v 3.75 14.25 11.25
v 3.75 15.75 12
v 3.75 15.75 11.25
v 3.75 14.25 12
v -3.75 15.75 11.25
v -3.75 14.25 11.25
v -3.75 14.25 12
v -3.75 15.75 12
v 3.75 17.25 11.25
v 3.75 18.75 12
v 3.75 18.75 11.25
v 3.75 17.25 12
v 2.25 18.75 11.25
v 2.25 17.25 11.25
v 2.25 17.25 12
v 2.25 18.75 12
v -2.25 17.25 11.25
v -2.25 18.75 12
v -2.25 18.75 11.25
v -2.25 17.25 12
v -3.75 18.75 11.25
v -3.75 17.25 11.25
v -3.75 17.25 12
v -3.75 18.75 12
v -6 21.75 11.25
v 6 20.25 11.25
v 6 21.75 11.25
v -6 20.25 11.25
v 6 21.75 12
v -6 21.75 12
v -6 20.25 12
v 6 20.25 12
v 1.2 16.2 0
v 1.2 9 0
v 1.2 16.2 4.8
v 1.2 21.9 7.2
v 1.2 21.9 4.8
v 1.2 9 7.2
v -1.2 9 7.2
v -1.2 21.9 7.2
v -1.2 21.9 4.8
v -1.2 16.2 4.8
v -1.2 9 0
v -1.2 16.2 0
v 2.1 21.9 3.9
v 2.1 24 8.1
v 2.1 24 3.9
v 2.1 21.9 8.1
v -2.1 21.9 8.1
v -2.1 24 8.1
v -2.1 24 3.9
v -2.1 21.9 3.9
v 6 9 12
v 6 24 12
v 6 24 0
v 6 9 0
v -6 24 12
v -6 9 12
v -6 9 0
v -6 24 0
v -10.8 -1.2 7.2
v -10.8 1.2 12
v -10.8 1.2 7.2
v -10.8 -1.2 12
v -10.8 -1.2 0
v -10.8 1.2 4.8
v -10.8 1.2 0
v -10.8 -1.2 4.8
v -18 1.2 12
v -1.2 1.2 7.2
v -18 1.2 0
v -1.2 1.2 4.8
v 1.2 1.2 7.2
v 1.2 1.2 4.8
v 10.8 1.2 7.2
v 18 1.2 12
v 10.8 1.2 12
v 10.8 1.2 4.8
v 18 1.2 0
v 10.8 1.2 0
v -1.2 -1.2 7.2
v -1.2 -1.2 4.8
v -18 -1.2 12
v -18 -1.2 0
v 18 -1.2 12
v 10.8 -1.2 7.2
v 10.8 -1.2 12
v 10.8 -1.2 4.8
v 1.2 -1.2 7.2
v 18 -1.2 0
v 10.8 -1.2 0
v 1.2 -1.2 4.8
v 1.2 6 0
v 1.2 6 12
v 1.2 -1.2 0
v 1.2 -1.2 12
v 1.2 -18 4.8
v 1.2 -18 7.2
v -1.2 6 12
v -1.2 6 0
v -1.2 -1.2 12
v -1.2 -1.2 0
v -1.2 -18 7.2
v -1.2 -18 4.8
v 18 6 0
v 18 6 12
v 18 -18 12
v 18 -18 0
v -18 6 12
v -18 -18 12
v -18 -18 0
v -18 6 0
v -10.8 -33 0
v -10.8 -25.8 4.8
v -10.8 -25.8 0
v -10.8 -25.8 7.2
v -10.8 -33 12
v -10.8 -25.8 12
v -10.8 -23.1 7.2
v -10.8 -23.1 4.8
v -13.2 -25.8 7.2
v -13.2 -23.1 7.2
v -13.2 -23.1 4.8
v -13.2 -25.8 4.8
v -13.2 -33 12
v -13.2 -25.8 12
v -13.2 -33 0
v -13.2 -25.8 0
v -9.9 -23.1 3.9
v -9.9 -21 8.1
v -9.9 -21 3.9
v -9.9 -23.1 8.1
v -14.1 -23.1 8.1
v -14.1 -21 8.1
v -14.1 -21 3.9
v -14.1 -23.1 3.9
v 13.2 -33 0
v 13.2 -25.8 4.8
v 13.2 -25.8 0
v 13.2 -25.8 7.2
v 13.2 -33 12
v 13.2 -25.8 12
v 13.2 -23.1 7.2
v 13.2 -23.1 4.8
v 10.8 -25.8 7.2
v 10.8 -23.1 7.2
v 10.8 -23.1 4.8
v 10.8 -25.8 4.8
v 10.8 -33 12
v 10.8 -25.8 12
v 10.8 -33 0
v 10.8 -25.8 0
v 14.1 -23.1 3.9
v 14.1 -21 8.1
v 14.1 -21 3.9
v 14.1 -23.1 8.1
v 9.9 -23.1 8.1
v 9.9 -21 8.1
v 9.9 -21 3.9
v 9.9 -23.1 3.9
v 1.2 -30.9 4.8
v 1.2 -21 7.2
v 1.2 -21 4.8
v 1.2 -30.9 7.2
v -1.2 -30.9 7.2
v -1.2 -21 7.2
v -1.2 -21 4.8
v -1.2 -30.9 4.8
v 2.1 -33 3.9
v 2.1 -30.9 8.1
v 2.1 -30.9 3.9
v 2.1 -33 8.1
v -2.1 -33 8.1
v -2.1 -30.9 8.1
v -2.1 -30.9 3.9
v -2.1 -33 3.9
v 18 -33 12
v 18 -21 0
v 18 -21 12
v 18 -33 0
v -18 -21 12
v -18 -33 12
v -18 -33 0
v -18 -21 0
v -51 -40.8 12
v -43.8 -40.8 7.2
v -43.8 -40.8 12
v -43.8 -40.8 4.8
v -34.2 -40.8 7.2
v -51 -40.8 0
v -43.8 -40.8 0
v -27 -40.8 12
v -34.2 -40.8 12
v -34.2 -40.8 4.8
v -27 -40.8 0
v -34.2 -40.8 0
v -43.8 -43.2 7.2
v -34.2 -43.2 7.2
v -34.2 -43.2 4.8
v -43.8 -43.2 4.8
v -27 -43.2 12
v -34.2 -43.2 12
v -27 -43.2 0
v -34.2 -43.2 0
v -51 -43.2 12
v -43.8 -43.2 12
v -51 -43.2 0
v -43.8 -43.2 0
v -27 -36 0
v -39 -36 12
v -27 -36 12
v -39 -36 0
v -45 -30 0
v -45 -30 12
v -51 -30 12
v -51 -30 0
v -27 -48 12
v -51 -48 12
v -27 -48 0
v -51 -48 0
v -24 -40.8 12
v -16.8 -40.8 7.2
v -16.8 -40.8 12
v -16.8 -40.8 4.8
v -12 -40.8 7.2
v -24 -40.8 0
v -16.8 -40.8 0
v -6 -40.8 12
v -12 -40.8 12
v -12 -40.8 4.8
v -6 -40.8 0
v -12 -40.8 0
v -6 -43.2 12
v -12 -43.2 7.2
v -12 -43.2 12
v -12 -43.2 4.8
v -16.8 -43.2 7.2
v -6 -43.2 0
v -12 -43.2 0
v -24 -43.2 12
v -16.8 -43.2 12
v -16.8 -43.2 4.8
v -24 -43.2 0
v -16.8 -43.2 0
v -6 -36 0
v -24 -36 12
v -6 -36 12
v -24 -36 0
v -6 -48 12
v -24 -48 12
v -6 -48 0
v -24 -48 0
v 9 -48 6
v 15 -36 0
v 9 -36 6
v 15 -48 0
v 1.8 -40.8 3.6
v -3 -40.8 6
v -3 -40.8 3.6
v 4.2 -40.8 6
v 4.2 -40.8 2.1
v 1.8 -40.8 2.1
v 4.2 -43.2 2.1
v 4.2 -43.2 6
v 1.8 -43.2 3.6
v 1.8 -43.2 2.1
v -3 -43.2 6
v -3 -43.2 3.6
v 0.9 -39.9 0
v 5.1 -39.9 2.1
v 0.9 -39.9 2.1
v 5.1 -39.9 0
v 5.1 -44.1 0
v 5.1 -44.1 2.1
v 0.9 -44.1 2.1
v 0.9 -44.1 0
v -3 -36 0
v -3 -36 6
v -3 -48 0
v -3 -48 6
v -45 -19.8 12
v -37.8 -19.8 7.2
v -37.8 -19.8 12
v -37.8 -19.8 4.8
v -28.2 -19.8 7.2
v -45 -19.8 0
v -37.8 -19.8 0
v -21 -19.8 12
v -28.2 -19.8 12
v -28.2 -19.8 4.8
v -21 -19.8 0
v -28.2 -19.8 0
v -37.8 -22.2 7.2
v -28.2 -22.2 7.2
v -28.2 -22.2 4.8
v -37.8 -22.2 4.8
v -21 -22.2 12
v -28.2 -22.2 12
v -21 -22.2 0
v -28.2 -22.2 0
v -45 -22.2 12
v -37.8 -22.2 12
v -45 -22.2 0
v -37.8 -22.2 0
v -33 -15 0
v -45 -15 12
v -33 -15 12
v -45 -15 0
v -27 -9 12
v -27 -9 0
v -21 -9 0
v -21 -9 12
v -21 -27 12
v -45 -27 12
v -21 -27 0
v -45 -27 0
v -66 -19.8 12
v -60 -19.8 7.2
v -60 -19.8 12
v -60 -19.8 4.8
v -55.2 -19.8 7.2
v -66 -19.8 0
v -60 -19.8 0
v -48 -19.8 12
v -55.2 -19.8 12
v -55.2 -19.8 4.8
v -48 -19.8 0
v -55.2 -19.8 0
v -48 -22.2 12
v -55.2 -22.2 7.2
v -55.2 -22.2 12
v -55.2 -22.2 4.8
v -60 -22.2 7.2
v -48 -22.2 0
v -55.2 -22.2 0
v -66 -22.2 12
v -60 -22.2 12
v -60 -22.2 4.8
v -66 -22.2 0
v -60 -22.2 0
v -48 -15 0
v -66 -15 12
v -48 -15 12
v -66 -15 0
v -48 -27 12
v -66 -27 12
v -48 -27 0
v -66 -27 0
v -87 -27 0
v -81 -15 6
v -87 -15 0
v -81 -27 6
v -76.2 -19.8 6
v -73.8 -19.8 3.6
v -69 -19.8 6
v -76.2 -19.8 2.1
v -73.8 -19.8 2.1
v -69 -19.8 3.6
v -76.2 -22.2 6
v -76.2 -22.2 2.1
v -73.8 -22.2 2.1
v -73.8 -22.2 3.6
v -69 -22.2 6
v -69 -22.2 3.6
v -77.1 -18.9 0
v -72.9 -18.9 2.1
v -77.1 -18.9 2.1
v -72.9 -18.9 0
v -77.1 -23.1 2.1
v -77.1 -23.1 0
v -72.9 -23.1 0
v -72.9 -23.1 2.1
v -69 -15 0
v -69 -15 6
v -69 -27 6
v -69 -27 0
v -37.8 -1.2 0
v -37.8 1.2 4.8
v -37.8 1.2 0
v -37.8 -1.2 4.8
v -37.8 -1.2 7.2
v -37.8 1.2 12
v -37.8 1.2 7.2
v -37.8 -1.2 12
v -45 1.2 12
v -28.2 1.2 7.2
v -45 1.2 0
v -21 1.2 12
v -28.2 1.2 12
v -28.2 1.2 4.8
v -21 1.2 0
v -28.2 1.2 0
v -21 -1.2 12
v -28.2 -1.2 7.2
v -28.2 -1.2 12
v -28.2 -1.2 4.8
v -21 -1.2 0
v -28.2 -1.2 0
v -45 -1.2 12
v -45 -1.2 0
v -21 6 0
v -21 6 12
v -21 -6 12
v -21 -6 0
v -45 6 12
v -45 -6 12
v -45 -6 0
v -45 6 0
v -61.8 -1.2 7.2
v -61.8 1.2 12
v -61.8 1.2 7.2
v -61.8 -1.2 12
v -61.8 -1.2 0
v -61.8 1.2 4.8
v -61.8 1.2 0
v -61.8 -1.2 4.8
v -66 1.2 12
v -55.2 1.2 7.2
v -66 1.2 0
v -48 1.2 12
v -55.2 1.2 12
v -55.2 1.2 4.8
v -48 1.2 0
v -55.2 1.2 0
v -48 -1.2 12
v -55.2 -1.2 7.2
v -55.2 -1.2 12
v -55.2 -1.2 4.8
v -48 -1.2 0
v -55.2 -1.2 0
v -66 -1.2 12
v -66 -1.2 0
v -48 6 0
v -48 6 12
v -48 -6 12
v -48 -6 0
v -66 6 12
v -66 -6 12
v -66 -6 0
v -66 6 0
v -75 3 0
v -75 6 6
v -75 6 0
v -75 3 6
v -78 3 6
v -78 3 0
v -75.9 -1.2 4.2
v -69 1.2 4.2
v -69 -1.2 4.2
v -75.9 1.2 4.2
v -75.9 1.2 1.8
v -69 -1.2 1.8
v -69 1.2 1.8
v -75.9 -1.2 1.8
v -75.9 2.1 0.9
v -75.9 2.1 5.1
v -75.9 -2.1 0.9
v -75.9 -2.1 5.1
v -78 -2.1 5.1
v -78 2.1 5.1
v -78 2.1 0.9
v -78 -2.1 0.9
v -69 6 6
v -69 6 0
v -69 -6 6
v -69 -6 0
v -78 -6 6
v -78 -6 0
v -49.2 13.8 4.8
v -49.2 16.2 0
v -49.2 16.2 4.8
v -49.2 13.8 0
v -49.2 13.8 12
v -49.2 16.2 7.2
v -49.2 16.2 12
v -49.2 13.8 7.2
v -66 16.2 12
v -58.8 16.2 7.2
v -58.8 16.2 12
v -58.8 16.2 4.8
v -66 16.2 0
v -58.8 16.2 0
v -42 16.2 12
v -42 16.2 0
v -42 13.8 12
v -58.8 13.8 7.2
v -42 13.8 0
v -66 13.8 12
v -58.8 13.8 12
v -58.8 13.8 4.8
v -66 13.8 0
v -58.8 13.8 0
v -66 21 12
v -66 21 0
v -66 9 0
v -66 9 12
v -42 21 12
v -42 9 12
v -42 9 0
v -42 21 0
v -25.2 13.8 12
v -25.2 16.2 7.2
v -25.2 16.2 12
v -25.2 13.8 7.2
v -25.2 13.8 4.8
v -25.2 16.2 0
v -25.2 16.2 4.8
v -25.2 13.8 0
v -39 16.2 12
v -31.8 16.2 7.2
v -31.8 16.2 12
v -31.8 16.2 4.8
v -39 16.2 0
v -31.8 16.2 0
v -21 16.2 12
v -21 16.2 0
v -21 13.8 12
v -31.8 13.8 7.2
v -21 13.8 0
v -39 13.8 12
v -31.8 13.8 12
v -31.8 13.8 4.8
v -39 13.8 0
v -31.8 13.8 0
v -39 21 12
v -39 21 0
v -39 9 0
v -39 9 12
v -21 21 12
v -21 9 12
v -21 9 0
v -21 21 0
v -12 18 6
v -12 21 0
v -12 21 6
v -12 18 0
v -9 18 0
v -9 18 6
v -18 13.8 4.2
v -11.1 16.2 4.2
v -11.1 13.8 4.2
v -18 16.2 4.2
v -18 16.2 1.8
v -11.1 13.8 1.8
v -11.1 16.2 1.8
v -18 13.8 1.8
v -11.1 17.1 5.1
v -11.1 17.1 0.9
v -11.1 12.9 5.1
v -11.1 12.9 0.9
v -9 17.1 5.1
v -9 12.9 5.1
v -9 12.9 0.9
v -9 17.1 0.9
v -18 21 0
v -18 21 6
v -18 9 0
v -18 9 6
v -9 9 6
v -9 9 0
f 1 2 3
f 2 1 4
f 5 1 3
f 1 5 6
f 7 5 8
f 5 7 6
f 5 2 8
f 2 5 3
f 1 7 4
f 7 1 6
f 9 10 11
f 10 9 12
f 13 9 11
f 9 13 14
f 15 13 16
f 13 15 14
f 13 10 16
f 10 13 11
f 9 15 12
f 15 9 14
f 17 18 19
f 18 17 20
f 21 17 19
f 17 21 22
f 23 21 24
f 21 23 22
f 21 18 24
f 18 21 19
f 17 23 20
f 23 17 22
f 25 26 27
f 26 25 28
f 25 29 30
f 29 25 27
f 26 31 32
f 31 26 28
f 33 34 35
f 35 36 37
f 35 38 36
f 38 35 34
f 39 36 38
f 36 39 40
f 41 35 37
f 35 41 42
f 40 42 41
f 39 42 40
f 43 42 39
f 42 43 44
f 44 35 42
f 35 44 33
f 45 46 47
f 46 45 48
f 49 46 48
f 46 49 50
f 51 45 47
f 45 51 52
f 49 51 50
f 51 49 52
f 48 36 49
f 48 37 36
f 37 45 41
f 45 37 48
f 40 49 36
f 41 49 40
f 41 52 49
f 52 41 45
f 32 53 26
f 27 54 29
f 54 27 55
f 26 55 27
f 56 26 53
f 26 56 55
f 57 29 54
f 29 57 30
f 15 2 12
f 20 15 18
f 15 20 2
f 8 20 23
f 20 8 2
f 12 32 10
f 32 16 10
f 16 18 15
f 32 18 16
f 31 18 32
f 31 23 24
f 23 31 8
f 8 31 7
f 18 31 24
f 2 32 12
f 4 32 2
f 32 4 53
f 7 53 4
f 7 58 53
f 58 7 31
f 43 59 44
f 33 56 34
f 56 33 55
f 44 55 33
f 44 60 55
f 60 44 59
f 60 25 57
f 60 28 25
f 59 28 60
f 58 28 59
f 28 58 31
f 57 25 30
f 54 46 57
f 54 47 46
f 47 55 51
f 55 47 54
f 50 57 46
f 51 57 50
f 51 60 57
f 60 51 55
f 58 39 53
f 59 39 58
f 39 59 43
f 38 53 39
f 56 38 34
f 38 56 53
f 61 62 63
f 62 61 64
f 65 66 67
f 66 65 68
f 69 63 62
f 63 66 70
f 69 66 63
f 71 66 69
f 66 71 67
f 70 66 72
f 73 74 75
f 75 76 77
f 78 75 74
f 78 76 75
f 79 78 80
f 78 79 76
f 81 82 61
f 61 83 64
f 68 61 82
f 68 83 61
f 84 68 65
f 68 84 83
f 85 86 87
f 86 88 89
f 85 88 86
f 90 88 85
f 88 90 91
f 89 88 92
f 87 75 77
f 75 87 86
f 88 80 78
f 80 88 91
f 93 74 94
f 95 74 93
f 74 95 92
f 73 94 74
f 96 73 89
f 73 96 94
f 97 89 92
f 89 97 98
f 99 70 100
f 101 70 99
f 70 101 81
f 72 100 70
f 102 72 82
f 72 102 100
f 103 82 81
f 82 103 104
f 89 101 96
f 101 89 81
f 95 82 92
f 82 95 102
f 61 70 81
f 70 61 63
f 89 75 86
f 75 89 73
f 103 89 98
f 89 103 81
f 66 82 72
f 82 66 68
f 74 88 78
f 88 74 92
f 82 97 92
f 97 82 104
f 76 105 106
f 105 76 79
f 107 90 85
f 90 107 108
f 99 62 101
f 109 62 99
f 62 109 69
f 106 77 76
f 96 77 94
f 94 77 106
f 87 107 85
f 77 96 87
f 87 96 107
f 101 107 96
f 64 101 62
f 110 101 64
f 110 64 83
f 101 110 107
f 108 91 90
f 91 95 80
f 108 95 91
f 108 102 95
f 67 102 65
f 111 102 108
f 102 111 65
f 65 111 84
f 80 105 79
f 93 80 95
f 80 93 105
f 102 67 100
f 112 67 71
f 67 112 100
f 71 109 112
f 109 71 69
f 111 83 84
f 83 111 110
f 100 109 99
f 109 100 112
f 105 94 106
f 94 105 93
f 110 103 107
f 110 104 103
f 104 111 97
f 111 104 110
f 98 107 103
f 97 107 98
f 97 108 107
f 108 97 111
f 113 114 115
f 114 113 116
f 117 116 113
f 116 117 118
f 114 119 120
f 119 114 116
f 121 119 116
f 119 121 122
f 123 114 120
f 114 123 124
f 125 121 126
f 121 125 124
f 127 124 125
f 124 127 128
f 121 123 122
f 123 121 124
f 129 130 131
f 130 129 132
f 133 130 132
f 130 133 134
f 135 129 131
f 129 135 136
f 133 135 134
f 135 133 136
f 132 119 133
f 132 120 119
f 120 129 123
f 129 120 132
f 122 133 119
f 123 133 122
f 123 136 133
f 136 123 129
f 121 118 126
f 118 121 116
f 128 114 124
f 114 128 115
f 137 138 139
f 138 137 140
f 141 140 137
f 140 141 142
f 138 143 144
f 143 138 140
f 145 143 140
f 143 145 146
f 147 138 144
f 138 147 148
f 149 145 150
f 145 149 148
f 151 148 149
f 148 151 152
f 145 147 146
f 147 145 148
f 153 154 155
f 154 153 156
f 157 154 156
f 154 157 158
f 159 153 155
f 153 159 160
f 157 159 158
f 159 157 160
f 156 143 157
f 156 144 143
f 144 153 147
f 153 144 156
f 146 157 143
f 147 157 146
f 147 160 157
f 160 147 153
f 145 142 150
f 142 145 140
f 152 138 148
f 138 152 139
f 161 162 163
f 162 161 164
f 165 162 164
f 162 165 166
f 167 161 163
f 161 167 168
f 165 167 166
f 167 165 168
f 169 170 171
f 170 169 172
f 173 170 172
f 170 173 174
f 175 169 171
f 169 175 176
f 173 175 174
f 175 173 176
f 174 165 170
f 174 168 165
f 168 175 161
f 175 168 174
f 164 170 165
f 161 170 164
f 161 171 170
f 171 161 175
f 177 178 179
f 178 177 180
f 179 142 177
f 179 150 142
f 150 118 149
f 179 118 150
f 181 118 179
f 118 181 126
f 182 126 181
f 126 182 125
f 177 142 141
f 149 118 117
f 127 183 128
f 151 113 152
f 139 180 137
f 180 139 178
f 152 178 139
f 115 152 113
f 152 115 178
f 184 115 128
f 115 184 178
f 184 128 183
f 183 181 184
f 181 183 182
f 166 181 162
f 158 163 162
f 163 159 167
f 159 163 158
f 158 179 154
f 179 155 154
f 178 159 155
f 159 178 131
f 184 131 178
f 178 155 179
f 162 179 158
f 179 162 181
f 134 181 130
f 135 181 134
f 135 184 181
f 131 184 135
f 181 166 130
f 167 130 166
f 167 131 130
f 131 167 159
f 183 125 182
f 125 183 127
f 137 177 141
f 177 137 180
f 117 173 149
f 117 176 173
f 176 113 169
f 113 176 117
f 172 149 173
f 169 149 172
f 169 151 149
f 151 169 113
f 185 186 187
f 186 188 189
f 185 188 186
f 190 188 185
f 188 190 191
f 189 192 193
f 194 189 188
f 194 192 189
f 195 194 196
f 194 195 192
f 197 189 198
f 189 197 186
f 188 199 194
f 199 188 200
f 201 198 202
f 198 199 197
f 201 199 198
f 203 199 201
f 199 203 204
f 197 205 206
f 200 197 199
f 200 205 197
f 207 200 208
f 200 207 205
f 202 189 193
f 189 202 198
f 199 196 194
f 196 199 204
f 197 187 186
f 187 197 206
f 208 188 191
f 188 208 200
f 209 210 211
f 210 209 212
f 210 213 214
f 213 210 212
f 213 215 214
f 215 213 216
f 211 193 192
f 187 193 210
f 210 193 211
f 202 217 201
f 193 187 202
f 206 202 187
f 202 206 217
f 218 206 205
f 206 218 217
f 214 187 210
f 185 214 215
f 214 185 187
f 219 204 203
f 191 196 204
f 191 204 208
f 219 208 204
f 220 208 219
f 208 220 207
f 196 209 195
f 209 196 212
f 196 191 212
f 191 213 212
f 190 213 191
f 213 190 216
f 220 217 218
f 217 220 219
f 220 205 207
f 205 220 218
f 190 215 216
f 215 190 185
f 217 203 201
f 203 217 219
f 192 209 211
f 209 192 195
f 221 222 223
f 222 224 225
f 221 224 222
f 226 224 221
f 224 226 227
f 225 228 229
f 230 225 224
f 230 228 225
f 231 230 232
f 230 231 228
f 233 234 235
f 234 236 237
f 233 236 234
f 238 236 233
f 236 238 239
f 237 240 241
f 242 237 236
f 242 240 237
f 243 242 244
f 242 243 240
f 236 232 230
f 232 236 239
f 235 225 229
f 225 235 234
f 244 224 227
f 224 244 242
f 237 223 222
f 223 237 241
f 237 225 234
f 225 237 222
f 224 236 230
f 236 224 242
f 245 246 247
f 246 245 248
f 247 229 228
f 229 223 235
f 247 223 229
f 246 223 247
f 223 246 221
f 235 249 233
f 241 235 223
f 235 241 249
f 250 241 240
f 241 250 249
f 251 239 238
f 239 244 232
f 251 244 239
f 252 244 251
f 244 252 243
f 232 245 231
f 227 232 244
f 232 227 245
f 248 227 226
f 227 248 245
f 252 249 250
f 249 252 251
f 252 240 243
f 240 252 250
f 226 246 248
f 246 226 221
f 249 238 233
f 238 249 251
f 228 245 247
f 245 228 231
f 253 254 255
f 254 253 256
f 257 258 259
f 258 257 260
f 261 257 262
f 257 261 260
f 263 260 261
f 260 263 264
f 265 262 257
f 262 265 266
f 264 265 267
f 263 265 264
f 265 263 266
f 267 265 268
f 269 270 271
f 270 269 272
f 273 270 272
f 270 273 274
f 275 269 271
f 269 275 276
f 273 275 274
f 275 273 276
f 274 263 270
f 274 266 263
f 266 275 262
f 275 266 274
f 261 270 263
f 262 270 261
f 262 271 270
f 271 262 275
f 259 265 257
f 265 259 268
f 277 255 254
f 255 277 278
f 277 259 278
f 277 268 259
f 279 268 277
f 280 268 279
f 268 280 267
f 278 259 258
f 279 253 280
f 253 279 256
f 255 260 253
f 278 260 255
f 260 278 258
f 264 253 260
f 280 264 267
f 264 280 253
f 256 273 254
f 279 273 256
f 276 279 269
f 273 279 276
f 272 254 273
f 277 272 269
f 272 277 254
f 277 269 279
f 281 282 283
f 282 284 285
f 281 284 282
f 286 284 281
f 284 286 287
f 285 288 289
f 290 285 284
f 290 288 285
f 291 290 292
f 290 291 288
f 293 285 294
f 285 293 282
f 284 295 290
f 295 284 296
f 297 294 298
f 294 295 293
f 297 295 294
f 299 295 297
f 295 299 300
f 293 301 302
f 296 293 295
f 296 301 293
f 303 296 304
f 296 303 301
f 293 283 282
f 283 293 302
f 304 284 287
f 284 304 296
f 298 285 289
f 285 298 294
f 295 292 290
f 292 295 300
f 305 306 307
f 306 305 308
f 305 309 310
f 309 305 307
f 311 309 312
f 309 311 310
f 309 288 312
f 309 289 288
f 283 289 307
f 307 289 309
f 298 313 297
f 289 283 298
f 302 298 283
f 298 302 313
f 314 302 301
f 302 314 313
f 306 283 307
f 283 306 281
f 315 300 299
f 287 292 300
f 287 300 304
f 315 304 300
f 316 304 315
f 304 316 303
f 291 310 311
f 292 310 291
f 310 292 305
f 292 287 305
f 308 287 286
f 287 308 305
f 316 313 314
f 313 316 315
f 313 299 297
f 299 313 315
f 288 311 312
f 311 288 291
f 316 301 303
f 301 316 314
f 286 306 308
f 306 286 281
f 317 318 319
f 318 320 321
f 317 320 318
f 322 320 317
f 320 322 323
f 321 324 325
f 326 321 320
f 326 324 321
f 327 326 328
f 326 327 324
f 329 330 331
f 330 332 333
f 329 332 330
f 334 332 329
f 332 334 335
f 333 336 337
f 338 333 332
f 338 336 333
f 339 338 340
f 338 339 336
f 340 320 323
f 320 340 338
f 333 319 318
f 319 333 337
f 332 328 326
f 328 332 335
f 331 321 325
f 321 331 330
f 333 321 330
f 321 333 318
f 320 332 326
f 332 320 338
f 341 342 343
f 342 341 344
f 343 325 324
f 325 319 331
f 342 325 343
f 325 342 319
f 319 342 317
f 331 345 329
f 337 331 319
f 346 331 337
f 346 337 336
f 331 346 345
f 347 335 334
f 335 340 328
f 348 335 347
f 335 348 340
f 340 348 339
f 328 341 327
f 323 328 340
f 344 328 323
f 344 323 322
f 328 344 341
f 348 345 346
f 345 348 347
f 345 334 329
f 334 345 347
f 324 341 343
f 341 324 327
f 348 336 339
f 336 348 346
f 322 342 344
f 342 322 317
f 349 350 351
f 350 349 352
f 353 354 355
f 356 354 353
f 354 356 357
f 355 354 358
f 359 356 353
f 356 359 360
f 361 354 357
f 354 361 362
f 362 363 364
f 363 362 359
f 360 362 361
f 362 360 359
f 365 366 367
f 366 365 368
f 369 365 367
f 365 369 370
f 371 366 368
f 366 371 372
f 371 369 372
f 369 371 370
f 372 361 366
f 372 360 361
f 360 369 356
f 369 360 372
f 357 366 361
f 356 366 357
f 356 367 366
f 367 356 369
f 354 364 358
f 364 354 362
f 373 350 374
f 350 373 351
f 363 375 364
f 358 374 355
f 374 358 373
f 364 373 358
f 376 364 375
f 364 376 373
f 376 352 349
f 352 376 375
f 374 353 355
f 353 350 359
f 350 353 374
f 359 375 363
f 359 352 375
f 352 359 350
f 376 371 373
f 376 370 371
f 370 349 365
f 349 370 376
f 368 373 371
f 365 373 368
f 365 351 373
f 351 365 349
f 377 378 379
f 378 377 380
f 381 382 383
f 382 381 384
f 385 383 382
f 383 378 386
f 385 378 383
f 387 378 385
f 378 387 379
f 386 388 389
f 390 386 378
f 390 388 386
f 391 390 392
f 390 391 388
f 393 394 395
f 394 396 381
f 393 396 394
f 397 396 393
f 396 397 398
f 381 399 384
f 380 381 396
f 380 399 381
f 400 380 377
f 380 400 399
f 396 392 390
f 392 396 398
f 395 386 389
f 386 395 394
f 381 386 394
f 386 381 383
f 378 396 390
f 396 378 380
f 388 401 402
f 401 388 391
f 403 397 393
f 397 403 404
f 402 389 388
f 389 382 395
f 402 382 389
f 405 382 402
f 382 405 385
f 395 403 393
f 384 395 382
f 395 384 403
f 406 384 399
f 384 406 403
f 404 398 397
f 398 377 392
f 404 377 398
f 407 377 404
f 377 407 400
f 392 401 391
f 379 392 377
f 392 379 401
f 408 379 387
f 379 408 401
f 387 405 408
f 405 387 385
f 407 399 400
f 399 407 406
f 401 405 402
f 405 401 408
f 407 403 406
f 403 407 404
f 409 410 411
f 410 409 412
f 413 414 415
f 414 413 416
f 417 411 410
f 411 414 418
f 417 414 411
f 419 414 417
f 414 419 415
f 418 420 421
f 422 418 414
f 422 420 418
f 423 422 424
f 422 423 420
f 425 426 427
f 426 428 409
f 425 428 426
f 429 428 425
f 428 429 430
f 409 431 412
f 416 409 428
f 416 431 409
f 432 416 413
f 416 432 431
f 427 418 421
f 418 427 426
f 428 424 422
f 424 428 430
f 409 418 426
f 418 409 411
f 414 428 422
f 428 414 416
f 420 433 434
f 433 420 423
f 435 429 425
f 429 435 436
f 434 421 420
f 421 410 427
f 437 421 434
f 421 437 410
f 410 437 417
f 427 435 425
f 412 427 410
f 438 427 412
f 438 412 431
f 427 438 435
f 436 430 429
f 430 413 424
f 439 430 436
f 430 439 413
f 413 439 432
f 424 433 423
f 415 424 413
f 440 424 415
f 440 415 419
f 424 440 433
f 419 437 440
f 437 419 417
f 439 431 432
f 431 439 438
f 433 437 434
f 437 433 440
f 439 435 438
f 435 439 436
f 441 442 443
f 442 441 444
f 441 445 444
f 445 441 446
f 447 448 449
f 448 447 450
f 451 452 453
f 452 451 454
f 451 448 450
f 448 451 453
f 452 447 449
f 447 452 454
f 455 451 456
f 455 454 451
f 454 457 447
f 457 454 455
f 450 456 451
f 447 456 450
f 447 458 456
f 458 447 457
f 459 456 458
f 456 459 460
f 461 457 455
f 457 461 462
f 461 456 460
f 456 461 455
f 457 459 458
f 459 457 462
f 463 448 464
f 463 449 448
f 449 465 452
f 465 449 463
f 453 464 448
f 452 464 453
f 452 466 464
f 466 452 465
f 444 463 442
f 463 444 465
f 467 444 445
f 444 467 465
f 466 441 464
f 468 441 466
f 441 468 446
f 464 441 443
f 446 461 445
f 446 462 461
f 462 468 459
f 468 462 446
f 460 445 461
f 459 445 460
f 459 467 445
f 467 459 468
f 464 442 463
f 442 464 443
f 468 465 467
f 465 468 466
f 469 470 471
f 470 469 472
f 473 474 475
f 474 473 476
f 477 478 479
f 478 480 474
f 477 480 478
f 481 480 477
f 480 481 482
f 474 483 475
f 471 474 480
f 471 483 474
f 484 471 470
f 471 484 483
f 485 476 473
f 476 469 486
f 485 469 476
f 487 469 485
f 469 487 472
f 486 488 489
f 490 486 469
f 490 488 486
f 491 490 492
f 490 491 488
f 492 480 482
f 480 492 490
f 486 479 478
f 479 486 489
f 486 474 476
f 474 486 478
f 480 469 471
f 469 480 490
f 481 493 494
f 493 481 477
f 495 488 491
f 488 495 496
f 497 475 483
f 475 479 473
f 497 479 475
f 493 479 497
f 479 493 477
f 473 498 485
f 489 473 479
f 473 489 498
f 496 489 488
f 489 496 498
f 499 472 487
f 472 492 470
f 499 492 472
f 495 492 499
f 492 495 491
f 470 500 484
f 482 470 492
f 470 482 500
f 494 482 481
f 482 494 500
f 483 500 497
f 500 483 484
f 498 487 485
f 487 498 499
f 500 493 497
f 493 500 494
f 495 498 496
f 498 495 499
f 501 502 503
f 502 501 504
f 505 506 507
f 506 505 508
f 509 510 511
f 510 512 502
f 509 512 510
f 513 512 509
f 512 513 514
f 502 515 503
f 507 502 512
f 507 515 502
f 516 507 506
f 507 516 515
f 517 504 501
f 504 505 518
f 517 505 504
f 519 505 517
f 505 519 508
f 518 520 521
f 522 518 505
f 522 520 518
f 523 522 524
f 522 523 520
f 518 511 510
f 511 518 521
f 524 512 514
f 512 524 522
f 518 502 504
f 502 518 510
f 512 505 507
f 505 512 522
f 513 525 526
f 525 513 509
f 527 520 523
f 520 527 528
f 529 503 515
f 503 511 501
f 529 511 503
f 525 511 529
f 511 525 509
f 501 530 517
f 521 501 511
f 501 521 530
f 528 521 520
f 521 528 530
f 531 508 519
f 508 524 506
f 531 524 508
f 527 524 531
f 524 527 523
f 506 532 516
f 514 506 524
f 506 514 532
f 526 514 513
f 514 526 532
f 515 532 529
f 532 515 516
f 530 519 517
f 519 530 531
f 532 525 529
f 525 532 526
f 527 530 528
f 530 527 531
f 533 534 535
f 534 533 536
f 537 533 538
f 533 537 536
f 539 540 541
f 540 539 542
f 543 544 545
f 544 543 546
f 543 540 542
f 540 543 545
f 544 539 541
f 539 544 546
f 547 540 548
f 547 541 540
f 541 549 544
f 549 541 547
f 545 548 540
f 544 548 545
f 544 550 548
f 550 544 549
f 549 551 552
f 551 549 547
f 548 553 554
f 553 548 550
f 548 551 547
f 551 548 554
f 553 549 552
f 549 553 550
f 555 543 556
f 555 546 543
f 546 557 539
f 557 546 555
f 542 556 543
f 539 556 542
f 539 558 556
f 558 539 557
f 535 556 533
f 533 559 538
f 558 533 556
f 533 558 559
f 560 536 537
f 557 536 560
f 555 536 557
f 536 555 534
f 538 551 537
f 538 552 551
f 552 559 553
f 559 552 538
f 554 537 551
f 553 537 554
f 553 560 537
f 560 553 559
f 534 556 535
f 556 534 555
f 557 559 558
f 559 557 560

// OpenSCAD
diam=.8;
end_factor=1.75;

module arm_right_aa()
{ 
    difference()
    {   
        cube([8,4,4], true);
        union()
        {
            translate([-4,0,0]) cube([4+diam,diam,6], true);
            //translate([4,-2,0]) cube([4+diam,4+diam,diam], true);
            translate([4,0,0]) cube([4+diam,diam,6], true);
            cube([10,diam,diam], true);
        }
    }
}

module arm_right_bb()
{ 
    difference()
    {   
        cube([6,4,4], true);
        union()
        {
            translate([-3,0,0]) cube([2+diam,diam,6], true);
            translate([3,0,0]) cube([4+diam,diam,6], true);
            cube([8,diam,diam], true);
        }
    }
}
module hand_right()
{
    difference()
    {
        cube([3,4,2], true);
        union()
        {
            translate([-1.5,2,0]) cube([2,2,6], true);
            cube([5,diam,diam], true);
            translate([-1.5,0,0]) cube(end_factor*diam*[1,1,1], true);
        }
    }
}

module right_arm()
{
    translate([-11,0,2])
    {
        arm_right_aa();
        translate([-8,0,0])
        {
            arm_right_bb();
            translate([-5.5,0,-1]) hand_right();
        }
    }
}

module body()
{
    difference()
    {
        cube([12,8,4], true);
        union()
        {
            
            translate([-6,2,0]) cube([4+diam,diam,6], true);
            //translate([-6,4,0]) cube([4+diam,4+diam,diam], true);
            
            translate([6,2,0]) cube([4+diam,diam,6], true);
            //translate([6,4,0]) cube([4+diam,4+diam,diam], true);
            
            translate([0,4,0]) cube([diam,4+diam,6], true);

            translate([0,2,0]) cube([14,diam,diam], true);
            cube([diam,10,diam], true);
        }
    }
}

module hip()
{
    difference()
    {
        cube([12,4,4], true);
        union()
        {
            cube([diam,6,diam], true);
            translate([0,-2,0]) cube(end_factor*diam*[1,1,1], true);
            
            translate([-4,0,0])
            {
                cube([diam,6,diam], true);
                translate([0,2,0]) cube(end_factor*diam*[1,1,1], true);
                translate([0,-2,0]) cube([diam,4+diam,6], true);
            }
            translate([4,0,0])
            {
                cube([diam,6,diam], true);
                translate([0,2,0]) cube(end_factor*diam*[1,1,1], true);
                translate([0,-2,0]) cube([diam,4+diam,6], true);
            }
        }
    }
}

module head(depth=.5)
{
    difference()
    {
        cube([4,5,4], true);
        union()
        {
            translate([0,-.5,0])
            {
                translate([0,0,2]) cube([2+depth,depth,depth], true);
                translate([1,1,2]) cube(depth*[1,1,1], true);
                translate([-1,1,2]) cube(depth*[1,1,1], true);
                translate([0,2,2]) cube([6,depth,depth], true);
            }

            cube([diam,7,diam], true);
            translate([0,-2.5,-2]) cube([diam,4+diam,4+diam], true);
            translate([0,2.5,0]) cube(end_factor*diam*[1,1,1], true);
        }
        
    }
}

module right_leg_aa()
{
    difference()
    {
        cube([6,8,4], true);
        union()
        {
            translate([-1,0,0])
            {
                cube([diam,10,diam], true);
                translate([0,-4,0]) cube([diam,4+diam,6], true);
                translate([0,4,0]) cube([diam,4+diam,6], true);
            }

            translate([3,-3,0]) cube([4,6,6], true);
            translate([1,0,-3]) rotate([0,0,-45]) cube([4,4,6]);
        }
    }
}

module right_leg_bb()
{
    difference()
    {   
        cube([4,6,4], true);
        union()
        {
            translate([0,-3-diam/2,0]) cube([diam,4+diam,4+diam], true);
            translate([0,3,0]) cube([diam,4+diam,6], true);
            cube([diam,8,diam], true);
        }
    }
}

module right_foot()
{
    difference()
    {
        translate([0,0,1]) cube([4,2,6], true);
        union()
        {
            translate([-3,1,2]) rotate([45,0,0]) cube([6,4,4]);
            cube([diam,4,diam], true);
            translate([0,-1,0]) cube(end_factor*diam*[1,1,1], true);
            translate([0,1,-2]) cube([diam,2*diam,4+diam], true);
        }
    }
}

module right_leg()
{
    translate([11,-8,2]) rotate([0,0,90])
    {
        right_leg_aa();
        translate([-1,-8,0])
        {
            right_leg_bb();
            translate([0,-6,-1]) rotate([90,0,0]) right_foot();
        }
    }
}  

scale([3,3,3])
{
    translate([0,5.5,2]) head();
    translate([0,-2,2]) body();
    translate([0,-9,2]) hip();
    
    translate([-24,-5,0]) right_leg();
    translate([0,2,0]) scale([-1,1,1]) right_leg();
    
    right_arm();
    translate([-29,5,0]) scale([-1,1,1]) right_arm();
}

//translate([0,.95,6.1]) right_foot();
//translate([0,3,2]) right_leg_bb();
//translate([0,6.05,4.1]) rotate([90,0,0]) translate([0,4,2]) rotate([0,-90,0]) translate([1,0])  right_leg_aa();

//translate([0,2.4,2]) head();
//translate([-4.1,0,0]) rotate([0,0,-90]) translate([-4,0,2]) arm_right_aa();
//translate([-3,10.1,2]) rotate([0,0,180]) rotate([90,0,0]) arm_right_bb();
//translate([-1,6.5,2]) rotate([-90,0,0]) rotate([0,-90,0]) hand_right();
//
//translate([0,-.1,-4.1]) rotate([180,0,0]) translate([0,-4,-2]) body();
